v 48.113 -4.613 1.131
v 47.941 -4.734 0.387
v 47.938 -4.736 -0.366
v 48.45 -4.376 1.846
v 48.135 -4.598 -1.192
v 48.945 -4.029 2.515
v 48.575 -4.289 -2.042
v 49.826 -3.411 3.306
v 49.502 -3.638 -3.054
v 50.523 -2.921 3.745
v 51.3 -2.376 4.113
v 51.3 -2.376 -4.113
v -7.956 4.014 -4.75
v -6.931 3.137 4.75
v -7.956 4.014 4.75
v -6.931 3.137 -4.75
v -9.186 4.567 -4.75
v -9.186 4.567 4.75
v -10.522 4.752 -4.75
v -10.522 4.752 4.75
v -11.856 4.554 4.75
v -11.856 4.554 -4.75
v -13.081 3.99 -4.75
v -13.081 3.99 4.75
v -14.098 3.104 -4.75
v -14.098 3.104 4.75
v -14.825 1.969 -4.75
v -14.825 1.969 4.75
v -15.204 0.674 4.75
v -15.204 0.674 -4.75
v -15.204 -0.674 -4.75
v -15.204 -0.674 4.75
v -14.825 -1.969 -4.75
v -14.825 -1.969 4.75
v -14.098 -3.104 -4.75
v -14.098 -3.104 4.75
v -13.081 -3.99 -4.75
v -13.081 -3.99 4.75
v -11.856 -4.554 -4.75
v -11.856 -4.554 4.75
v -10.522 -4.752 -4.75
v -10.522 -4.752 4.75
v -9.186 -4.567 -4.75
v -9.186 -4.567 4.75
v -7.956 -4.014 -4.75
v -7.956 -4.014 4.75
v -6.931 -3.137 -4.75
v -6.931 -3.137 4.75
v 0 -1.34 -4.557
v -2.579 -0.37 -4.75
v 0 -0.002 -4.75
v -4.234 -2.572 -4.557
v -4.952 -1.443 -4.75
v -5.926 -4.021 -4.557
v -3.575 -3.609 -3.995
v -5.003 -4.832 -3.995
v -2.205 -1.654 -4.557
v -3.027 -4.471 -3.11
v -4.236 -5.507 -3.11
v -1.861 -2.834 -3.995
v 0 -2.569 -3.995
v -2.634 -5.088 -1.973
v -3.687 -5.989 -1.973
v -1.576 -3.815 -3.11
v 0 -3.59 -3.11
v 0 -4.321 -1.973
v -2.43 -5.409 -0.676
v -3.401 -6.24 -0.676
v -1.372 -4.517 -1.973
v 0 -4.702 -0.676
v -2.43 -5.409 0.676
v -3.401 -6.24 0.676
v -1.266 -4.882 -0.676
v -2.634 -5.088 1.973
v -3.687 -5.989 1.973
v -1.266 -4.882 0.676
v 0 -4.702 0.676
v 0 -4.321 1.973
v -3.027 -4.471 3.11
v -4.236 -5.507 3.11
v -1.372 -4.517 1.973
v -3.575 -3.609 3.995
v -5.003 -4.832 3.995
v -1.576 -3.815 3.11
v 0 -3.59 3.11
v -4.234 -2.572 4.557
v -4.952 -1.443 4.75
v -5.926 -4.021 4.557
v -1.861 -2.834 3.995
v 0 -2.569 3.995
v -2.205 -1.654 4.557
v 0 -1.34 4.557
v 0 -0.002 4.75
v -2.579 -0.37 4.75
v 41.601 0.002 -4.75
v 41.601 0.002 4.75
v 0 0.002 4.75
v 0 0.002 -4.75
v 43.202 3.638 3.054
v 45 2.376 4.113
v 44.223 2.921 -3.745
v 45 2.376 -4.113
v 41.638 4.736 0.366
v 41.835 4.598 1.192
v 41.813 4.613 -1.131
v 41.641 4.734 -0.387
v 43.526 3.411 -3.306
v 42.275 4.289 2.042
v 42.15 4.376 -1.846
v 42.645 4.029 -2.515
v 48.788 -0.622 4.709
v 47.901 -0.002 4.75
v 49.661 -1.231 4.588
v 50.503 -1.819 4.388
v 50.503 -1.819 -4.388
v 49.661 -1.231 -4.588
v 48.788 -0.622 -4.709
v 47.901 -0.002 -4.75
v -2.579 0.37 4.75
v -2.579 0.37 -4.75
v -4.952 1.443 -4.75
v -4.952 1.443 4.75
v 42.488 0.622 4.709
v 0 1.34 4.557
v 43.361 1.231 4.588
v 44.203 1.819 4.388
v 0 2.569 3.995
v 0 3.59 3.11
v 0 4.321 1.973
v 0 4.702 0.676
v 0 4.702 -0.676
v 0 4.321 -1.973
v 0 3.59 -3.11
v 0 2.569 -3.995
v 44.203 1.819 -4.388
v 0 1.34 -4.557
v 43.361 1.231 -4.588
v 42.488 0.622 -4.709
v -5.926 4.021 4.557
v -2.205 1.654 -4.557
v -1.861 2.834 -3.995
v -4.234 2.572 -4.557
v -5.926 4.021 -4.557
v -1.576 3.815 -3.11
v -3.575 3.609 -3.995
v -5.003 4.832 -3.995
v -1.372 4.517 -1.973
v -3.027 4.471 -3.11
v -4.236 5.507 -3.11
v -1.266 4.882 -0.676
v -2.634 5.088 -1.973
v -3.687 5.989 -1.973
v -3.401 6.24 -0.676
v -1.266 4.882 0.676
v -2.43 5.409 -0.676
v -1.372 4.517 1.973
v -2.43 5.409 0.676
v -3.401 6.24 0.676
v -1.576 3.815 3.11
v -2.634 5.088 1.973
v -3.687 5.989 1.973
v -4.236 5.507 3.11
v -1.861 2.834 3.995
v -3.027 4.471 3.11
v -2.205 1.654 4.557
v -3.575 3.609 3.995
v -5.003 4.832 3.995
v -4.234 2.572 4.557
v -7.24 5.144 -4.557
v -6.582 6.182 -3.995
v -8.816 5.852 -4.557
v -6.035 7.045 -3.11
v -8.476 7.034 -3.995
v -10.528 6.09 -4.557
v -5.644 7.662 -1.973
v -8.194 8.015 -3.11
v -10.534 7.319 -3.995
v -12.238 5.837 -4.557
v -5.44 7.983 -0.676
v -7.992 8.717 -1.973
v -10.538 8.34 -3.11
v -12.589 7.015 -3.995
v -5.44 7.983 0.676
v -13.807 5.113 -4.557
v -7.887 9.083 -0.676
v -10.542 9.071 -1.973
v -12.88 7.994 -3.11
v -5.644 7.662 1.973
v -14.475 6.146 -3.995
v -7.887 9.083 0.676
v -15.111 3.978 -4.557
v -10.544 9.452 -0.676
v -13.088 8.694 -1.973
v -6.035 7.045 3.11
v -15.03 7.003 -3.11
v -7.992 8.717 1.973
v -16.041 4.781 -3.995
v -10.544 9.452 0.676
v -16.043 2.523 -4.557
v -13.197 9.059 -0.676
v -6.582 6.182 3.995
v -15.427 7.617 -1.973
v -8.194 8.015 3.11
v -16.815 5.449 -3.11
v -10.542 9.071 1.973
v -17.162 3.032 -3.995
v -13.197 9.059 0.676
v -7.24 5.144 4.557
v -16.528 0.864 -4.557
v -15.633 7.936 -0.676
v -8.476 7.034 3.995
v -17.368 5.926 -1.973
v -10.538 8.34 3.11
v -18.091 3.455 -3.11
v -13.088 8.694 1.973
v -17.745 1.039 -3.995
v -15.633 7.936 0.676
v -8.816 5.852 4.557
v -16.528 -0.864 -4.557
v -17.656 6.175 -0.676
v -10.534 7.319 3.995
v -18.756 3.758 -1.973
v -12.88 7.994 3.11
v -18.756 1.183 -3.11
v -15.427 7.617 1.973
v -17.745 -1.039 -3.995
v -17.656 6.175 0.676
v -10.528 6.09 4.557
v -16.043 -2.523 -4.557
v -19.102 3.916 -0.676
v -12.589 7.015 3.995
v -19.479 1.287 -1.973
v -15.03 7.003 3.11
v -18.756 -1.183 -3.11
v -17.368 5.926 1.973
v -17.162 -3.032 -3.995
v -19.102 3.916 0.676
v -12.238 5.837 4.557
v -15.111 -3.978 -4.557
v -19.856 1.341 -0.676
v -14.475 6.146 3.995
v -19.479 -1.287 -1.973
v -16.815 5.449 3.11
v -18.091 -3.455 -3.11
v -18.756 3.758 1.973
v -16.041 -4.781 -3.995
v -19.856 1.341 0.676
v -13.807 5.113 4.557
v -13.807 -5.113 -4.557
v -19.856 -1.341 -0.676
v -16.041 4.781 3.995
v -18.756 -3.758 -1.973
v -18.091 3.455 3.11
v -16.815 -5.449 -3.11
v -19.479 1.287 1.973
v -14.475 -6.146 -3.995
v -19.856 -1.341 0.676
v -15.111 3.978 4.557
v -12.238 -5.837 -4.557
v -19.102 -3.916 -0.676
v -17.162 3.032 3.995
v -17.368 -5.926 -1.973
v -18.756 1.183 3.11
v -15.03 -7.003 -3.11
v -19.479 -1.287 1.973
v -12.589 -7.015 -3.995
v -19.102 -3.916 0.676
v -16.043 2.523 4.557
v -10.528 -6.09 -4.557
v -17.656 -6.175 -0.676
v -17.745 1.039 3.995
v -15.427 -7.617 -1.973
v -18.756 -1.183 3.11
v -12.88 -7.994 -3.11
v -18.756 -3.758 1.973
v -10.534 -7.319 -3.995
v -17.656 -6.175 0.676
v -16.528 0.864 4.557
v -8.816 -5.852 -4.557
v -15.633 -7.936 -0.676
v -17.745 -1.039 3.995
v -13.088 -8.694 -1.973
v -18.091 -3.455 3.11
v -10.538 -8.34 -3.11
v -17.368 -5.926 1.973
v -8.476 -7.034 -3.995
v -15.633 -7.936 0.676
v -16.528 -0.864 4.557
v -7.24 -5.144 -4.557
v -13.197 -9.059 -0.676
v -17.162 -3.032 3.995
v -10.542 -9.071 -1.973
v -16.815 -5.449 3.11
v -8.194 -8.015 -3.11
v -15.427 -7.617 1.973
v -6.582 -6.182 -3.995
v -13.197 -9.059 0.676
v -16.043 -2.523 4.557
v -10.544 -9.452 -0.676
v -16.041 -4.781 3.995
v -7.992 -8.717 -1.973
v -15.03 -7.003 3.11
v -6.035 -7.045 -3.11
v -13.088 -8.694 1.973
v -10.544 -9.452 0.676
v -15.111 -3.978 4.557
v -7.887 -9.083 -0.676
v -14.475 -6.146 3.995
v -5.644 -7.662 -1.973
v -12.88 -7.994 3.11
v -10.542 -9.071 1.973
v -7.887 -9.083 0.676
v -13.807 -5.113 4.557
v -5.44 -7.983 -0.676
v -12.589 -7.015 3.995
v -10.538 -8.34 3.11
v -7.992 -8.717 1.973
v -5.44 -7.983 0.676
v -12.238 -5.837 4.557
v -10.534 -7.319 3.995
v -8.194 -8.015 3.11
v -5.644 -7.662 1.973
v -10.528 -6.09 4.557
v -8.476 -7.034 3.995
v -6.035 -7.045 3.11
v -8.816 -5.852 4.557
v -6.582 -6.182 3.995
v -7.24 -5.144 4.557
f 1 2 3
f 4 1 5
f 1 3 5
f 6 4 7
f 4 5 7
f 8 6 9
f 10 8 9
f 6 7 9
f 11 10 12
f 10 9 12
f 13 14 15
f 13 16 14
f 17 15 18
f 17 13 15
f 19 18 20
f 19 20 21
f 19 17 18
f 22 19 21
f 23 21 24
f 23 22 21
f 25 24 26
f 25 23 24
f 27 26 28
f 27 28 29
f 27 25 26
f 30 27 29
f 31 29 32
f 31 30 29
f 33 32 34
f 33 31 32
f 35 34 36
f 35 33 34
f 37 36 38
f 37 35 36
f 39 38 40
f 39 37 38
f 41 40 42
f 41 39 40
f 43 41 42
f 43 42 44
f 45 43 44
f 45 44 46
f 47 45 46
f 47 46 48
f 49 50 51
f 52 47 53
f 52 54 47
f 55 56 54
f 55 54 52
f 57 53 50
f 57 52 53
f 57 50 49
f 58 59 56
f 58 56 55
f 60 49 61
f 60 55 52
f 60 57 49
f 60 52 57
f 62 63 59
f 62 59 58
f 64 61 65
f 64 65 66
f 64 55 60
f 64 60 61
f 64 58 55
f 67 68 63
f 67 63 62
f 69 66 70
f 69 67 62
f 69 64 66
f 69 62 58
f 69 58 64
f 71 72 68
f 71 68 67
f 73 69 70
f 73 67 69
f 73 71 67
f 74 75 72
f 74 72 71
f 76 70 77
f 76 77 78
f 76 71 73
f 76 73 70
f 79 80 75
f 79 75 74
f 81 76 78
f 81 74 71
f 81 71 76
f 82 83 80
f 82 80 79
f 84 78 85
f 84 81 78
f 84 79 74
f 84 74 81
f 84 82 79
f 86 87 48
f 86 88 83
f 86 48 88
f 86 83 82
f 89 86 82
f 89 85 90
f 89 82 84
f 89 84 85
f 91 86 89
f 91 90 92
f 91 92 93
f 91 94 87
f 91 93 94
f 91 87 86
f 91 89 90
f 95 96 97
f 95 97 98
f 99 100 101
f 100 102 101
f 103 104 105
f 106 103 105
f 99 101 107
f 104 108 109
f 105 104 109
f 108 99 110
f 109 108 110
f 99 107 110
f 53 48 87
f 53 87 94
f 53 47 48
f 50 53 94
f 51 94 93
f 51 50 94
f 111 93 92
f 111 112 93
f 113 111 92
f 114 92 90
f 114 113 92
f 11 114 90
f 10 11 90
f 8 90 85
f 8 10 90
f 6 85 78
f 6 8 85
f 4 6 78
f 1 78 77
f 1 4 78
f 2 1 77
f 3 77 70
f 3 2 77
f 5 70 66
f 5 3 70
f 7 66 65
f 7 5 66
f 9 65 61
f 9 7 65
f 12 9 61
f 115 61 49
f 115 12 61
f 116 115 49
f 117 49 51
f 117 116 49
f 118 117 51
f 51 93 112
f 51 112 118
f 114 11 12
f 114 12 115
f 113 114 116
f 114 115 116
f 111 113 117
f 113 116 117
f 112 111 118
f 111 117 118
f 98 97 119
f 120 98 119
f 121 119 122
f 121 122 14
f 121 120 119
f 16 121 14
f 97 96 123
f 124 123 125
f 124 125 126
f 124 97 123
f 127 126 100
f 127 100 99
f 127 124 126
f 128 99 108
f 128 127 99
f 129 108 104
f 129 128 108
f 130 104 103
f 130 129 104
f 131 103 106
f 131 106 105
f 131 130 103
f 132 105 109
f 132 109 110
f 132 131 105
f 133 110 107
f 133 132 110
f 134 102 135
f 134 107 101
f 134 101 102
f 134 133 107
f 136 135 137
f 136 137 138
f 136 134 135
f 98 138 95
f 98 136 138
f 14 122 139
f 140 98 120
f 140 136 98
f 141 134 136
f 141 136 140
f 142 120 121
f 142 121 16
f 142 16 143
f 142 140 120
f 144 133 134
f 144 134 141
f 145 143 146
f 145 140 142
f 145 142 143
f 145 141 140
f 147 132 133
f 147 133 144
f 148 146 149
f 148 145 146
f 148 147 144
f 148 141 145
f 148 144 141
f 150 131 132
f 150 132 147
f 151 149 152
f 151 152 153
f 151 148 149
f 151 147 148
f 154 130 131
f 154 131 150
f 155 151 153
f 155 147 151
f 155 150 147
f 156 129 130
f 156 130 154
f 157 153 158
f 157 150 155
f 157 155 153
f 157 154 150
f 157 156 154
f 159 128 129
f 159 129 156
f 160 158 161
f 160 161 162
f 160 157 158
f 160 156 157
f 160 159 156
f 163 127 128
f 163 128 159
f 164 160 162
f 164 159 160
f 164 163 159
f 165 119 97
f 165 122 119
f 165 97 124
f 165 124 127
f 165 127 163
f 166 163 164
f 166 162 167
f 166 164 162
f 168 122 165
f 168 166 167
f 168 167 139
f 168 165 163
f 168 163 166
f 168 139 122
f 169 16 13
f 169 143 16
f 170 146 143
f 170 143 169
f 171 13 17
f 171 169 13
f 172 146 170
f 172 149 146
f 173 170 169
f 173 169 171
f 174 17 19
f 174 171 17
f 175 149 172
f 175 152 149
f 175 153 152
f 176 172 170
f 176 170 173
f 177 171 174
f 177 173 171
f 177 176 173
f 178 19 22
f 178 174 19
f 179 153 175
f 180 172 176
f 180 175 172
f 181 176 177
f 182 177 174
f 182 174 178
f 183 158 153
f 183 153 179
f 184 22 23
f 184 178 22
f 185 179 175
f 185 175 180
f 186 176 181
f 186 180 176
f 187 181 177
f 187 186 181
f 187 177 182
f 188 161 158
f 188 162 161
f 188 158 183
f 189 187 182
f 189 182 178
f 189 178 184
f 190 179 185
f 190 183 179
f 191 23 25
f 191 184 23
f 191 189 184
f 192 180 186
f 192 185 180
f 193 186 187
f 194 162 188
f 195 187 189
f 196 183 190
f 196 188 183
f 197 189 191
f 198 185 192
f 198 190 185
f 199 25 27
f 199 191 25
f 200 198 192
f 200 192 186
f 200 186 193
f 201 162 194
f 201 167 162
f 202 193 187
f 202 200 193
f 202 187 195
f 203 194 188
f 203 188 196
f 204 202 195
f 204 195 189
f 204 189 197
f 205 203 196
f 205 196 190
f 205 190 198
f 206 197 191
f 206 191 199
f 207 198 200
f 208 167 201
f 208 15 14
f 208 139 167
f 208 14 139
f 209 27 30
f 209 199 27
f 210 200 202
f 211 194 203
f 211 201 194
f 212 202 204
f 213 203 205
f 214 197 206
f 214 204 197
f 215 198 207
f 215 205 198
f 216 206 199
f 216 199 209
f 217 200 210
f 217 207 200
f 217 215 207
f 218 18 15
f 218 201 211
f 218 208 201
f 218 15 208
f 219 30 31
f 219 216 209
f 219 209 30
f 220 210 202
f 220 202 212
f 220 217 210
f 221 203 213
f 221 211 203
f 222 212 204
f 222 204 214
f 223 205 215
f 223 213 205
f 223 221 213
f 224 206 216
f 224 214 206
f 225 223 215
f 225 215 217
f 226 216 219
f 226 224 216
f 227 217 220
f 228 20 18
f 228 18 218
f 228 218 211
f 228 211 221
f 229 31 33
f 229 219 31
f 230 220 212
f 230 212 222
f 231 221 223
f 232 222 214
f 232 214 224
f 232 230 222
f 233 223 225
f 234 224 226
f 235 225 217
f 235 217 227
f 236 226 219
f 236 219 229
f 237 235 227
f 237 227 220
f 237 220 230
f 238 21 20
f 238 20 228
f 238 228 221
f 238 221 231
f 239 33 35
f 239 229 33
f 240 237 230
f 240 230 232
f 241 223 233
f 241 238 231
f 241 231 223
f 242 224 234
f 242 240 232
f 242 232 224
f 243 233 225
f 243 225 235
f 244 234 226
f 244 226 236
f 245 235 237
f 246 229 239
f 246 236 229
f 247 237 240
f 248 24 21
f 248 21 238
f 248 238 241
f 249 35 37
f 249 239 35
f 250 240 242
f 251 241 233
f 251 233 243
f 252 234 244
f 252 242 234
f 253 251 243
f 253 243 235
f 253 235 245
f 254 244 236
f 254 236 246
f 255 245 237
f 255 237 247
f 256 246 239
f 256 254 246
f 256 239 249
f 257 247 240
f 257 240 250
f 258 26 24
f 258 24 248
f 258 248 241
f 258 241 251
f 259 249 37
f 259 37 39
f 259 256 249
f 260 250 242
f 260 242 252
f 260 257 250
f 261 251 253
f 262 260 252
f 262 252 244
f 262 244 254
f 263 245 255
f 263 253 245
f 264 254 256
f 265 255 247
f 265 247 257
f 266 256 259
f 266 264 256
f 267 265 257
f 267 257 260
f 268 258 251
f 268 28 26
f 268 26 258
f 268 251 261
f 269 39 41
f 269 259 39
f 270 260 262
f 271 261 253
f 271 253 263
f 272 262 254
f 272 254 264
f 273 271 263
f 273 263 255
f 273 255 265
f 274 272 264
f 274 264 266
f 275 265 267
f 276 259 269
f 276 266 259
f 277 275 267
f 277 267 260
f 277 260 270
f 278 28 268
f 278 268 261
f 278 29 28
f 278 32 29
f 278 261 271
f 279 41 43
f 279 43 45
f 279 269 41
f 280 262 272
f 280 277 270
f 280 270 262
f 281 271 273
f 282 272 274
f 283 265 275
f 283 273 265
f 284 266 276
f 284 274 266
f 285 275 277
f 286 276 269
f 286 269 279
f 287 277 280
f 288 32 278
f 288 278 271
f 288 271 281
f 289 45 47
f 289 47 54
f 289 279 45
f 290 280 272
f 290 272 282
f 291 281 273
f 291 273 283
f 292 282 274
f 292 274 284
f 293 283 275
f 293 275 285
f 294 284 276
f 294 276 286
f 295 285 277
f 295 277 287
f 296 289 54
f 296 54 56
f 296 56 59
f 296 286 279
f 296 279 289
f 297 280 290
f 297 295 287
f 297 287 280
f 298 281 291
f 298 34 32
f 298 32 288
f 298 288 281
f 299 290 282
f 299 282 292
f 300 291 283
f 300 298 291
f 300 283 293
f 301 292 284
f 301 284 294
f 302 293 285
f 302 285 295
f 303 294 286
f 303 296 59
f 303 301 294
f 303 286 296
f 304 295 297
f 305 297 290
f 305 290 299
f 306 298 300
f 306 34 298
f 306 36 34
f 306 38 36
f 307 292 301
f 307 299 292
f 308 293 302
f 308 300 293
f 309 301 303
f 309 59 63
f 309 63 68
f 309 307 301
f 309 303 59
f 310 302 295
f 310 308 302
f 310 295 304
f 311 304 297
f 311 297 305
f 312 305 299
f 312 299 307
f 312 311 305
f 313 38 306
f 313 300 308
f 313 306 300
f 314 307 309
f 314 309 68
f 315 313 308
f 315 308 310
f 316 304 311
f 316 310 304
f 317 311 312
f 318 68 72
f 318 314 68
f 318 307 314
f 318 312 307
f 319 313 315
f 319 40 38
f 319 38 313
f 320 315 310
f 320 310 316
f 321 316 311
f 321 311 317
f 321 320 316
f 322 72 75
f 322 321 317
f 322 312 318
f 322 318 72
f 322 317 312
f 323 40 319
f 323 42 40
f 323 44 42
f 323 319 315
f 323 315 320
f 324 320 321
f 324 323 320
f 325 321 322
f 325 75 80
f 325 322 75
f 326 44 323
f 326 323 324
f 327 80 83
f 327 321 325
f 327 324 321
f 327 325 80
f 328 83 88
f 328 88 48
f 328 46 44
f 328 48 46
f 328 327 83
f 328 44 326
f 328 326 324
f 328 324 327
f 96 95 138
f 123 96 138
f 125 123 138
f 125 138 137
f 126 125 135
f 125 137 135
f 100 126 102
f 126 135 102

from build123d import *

# Parameters (mm, degrees)
CONECUT_DEPTH      = 53.387999569
CONECUT_DEPTH_BACK = 53.387999569


with BuildPart() as part:
    # Body: sweep along a path in PathSke
    with BuildLine(Plane.XY) as body_path:
        Line((45, 4.75), (0, 4.75))
        ThreePointArc((0, 4.75), (-1.846620522, 5.148259898), (-3.364941176, 6.272235294))
        ThreePointArc((-3.364941176, 6.272235294), (-20, 0), (-3.364941176, -6.272235294))
        ThreePointArc((-3.364941176, -6.272235294), (-1.846620522, -5.148259898), (0, -4.75))
        Line((0, -4.75), (51.3, -4.75))
    # SectionSke → Body (sweep)
    with BuildSketch(Plane(origin=(45, 0, 0), x_dir=(0, 0, -1), z_dir=(1, 0, 0))):
        with BuildLine():
            Line((-4.749999579, 0.002), (4.749999579, 0.002))
            ThreePointArc((4.749999579, 0.002), (0, 4.75), (-4.749999579, 0.002))
        make_face()
    sweep(path=body_path.line)

    # ConeCutSke → ConeCut (cut, two sides: drawn at the far end of the back side and taken through both)
    with BuildSketch(Plane.XY.offset(-CONECUT_DEPTH_BACK)):
        Polygon((45, 2.376), (41.603808574, 4.76), (51.31, 4.76), (51.31, -4.76), (47.903808574, -4.76), (51.3, -2.376), (47.898206914, 0), (41.598206914, 0), align=None)
    extrude(amount=CONECUT_DEPTH + CONECUT_DEPTH_BACK, mode=Mode.SUBTRACT)


solid = part.part
